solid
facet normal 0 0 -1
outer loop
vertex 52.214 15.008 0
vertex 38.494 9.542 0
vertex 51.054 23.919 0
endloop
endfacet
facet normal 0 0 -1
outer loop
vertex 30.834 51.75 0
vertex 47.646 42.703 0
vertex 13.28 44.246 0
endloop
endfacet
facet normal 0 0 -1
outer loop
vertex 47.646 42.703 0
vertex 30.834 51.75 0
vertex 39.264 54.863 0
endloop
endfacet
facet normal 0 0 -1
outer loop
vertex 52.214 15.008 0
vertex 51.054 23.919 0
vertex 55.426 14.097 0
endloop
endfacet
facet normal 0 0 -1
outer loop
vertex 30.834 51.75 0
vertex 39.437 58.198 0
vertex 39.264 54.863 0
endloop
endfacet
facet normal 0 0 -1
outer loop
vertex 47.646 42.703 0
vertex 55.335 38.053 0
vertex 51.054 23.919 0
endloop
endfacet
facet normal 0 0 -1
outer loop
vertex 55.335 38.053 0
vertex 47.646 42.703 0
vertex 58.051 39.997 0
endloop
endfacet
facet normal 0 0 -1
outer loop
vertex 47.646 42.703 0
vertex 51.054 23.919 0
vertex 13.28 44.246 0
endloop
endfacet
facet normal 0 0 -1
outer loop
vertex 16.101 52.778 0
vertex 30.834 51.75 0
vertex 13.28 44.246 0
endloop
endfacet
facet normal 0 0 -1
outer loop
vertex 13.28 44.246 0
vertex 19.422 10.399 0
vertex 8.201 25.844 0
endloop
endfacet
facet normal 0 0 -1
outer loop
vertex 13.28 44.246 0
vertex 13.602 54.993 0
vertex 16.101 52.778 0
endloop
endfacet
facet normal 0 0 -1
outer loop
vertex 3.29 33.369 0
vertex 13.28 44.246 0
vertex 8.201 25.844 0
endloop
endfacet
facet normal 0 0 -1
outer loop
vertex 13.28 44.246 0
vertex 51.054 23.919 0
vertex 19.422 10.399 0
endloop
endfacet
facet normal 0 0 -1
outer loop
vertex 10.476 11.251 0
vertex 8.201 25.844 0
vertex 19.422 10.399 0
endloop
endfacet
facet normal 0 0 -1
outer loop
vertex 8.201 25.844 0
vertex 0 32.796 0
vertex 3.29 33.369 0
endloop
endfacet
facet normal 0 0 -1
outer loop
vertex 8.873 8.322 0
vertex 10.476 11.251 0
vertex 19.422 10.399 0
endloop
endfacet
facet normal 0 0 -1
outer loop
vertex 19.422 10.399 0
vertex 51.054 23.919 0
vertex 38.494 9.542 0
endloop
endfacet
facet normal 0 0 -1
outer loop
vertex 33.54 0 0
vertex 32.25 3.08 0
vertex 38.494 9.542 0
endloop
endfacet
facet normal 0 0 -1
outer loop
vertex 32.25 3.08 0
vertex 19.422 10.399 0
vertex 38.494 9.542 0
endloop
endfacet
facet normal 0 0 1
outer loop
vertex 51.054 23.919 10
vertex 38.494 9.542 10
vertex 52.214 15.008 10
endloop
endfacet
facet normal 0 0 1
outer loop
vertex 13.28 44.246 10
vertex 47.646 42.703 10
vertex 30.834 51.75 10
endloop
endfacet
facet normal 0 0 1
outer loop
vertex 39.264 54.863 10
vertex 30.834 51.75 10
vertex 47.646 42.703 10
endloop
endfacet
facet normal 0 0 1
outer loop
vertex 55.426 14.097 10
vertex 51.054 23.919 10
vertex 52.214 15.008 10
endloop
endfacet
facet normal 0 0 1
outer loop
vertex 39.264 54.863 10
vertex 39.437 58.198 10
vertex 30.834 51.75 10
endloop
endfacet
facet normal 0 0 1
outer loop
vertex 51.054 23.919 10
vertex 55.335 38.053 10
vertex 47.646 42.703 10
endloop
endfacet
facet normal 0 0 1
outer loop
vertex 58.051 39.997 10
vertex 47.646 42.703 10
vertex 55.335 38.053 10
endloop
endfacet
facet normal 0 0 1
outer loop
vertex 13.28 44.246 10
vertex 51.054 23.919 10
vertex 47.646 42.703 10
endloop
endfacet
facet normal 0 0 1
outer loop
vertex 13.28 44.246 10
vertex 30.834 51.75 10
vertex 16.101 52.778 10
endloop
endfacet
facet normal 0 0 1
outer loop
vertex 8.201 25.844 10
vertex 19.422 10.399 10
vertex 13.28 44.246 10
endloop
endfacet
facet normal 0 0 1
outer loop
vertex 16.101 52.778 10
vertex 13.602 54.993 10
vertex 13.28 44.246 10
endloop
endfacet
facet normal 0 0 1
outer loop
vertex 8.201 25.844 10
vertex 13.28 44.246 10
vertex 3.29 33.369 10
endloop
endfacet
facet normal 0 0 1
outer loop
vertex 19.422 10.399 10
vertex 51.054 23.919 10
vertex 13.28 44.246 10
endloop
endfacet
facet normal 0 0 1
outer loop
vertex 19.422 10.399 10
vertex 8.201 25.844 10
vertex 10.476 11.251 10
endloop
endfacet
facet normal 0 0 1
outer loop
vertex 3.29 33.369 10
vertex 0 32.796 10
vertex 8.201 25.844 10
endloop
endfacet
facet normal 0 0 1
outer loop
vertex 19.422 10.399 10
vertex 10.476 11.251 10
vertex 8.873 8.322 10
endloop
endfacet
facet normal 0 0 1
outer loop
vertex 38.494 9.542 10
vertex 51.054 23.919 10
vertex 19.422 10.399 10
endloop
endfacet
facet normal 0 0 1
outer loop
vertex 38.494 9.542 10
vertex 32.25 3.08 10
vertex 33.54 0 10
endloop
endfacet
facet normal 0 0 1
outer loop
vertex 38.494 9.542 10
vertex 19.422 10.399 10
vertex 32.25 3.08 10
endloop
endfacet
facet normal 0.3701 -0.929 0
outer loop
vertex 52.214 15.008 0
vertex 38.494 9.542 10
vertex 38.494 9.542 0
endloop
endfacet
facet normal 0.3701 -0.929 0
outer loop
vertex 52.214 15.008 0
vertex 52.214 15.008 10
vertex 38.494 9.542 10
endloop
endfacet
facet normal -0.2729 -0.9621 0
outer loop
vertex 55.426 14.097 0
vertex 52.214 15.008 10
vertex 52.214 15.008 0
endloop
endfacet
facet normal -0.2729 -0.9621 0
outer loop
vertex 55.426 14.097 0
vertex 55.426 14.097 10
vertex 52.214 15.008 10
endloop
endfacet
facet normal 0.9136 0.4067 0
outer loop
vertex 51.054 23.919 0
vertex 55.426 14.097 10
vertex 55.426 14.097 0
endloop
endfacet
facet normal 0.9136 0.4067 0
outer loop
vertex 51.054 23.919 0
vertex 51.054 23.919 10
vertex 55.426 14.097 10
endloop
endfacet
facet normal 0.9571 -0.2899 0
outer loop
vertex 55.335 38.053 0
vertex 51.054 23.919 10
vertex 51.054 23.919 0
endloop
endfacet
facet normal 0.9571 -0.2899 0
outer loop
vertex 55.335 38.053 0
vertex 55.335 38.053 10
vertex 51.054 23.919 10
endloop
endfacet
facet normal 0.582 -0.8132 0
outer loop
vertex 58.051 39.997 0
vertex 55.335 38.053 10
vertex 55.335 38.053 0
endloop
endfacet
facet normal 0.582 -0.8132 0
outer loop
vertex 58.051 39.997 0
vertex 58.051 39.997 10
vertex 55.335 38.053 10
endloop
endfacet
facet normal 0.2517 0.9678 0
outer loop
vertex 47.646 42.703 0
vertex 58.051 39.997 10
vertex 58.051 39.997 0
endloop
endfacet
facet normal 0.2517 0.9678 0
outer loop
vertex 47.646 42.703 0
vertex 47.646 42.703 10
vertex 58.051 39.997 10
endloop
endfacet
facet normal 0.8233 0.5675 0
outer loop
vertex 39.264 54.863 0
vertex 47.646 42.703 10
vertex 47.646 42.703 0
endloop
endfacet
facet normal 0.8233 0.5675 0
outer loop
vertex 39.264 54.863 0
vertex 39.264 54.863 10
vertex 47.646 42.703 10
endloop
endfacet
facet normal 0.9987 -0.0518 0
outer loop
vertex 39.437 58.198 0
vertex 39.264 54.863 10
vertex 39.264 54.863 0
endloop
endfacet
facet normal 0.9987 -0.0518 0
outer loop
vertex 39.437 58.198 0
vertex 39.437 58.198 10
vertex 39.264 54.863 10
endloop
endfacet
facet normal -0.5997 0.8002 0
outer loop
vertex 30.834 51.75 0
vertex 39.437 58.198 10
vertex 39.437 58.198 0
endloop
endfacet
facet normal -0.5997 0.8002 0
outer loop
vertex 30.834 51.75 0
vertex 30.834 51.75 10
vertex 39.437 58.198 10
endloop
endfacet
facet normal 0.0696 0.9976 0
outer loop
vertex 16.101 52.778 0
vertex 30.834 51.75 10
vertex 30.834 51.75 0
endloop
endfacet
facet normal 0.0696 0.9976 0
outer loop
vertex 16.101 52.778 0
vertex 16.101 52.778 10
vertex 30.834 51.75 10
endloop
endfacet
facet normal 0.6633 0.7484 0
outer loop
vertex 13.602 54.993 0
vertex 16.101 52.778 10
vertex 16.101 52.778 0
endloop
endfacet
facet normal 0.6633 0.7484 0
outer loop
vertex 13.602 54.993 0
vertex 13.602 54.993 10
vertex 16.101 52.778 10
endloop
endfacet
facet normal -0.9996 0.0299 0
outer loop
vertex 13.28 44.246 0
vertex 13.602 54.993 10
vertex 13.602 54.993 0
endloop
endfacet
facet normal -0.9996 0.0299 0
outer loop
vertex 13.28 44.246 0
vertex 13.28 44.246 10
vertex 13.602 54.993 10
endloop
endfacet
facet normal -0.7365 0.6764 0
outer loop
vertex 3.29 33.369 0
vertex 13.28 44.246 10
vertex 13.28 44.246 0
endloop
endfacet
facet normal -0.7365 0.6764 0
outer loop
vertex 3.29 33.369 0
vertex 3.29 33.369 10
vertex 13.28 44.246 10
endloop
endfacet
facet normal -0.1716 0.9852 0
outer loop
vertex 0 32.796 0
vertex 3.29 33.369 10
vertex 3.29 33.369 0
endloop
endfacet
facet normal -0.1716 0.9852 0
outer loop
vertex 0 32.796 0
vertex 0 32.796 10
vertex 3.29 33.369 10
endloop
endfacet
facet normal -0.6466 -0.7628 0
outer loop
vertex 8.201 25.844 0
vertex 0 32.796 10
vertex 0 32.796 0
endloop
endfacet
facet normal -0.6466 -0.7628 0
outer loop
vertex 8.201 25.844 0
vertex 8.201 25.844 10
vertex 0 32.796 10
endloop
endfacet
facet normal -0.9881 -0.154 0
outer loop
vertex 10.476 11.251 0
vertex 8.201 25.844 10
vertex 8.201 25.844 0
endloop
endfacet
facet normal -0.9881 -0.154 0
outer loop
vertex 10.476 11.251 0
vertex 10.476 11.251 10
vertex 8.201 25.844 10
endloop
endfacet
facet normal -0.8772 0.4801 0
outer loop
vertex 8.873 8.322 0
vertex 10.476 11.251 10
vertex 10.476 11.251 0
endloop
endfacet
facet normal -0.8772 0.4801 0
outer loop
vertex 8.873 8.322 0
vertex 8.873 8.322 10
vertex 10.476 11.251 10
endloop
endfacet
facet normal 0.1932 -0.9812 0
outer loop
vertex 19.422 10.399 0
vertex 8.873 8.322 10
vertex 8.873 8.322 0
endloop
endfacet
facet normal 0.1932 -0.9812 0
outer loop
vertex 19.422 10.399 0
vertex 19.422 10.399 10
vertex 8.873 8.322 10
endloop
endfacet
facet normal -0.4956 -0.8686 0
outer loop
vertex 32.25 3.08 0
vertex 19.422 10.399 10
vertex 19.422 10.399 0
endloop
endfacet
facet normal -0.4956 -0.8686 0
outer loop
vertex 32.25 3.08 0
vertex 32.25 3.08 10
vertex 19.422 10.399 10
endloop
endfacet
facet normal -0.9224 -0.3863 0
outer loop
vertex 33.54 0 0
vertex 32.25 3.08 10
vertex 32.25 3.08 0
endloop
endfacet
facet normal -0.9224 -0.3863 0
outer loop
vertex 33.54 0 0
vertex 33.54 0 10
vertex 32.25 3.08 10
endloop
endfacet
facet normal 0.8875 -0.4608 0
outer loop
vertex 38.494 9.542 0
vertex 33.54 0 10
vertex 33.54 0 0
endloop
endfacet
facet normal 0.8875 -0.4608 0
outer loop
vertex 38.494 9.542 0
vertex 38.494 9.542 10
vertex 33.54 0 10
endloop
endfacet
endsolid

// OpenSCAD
$fn = 32;

// ----------------------------------------------------------------------
// Fan rotor section: 7 blades, 22 mm hub radius, 8 mm blades
// ----------------------------------------------------------------------

// --- parameters (mm) ---
profile_height = 10;      // extrusion height
profile_points = 21;      // points of the closed outline

profile = [[51.054, 23.919], [55.335, 38.053], [58.051, 39.997], [47.646, 42.703], [39.264, 54.863], [39.437, 58.198], [30.834, 51.75], [16.101, 52.778], [13.602, 54.993], [13.28, 44.246], [3.29, 33.369], [0, 32.796], [8.201, 25.844], [10.476, 11.251], [8.873, 8.322], [19.422, 10.399], [32.25, 3.08], [33.54, 0], [38.494, 9.542], [52.214, 15.008], [55.426, 14.097]];  // single closed polygon, 21 points, counter clockwise

// --- the one profile operation ---
linear_extrude(height = profile_height) polygon(points = profile);
